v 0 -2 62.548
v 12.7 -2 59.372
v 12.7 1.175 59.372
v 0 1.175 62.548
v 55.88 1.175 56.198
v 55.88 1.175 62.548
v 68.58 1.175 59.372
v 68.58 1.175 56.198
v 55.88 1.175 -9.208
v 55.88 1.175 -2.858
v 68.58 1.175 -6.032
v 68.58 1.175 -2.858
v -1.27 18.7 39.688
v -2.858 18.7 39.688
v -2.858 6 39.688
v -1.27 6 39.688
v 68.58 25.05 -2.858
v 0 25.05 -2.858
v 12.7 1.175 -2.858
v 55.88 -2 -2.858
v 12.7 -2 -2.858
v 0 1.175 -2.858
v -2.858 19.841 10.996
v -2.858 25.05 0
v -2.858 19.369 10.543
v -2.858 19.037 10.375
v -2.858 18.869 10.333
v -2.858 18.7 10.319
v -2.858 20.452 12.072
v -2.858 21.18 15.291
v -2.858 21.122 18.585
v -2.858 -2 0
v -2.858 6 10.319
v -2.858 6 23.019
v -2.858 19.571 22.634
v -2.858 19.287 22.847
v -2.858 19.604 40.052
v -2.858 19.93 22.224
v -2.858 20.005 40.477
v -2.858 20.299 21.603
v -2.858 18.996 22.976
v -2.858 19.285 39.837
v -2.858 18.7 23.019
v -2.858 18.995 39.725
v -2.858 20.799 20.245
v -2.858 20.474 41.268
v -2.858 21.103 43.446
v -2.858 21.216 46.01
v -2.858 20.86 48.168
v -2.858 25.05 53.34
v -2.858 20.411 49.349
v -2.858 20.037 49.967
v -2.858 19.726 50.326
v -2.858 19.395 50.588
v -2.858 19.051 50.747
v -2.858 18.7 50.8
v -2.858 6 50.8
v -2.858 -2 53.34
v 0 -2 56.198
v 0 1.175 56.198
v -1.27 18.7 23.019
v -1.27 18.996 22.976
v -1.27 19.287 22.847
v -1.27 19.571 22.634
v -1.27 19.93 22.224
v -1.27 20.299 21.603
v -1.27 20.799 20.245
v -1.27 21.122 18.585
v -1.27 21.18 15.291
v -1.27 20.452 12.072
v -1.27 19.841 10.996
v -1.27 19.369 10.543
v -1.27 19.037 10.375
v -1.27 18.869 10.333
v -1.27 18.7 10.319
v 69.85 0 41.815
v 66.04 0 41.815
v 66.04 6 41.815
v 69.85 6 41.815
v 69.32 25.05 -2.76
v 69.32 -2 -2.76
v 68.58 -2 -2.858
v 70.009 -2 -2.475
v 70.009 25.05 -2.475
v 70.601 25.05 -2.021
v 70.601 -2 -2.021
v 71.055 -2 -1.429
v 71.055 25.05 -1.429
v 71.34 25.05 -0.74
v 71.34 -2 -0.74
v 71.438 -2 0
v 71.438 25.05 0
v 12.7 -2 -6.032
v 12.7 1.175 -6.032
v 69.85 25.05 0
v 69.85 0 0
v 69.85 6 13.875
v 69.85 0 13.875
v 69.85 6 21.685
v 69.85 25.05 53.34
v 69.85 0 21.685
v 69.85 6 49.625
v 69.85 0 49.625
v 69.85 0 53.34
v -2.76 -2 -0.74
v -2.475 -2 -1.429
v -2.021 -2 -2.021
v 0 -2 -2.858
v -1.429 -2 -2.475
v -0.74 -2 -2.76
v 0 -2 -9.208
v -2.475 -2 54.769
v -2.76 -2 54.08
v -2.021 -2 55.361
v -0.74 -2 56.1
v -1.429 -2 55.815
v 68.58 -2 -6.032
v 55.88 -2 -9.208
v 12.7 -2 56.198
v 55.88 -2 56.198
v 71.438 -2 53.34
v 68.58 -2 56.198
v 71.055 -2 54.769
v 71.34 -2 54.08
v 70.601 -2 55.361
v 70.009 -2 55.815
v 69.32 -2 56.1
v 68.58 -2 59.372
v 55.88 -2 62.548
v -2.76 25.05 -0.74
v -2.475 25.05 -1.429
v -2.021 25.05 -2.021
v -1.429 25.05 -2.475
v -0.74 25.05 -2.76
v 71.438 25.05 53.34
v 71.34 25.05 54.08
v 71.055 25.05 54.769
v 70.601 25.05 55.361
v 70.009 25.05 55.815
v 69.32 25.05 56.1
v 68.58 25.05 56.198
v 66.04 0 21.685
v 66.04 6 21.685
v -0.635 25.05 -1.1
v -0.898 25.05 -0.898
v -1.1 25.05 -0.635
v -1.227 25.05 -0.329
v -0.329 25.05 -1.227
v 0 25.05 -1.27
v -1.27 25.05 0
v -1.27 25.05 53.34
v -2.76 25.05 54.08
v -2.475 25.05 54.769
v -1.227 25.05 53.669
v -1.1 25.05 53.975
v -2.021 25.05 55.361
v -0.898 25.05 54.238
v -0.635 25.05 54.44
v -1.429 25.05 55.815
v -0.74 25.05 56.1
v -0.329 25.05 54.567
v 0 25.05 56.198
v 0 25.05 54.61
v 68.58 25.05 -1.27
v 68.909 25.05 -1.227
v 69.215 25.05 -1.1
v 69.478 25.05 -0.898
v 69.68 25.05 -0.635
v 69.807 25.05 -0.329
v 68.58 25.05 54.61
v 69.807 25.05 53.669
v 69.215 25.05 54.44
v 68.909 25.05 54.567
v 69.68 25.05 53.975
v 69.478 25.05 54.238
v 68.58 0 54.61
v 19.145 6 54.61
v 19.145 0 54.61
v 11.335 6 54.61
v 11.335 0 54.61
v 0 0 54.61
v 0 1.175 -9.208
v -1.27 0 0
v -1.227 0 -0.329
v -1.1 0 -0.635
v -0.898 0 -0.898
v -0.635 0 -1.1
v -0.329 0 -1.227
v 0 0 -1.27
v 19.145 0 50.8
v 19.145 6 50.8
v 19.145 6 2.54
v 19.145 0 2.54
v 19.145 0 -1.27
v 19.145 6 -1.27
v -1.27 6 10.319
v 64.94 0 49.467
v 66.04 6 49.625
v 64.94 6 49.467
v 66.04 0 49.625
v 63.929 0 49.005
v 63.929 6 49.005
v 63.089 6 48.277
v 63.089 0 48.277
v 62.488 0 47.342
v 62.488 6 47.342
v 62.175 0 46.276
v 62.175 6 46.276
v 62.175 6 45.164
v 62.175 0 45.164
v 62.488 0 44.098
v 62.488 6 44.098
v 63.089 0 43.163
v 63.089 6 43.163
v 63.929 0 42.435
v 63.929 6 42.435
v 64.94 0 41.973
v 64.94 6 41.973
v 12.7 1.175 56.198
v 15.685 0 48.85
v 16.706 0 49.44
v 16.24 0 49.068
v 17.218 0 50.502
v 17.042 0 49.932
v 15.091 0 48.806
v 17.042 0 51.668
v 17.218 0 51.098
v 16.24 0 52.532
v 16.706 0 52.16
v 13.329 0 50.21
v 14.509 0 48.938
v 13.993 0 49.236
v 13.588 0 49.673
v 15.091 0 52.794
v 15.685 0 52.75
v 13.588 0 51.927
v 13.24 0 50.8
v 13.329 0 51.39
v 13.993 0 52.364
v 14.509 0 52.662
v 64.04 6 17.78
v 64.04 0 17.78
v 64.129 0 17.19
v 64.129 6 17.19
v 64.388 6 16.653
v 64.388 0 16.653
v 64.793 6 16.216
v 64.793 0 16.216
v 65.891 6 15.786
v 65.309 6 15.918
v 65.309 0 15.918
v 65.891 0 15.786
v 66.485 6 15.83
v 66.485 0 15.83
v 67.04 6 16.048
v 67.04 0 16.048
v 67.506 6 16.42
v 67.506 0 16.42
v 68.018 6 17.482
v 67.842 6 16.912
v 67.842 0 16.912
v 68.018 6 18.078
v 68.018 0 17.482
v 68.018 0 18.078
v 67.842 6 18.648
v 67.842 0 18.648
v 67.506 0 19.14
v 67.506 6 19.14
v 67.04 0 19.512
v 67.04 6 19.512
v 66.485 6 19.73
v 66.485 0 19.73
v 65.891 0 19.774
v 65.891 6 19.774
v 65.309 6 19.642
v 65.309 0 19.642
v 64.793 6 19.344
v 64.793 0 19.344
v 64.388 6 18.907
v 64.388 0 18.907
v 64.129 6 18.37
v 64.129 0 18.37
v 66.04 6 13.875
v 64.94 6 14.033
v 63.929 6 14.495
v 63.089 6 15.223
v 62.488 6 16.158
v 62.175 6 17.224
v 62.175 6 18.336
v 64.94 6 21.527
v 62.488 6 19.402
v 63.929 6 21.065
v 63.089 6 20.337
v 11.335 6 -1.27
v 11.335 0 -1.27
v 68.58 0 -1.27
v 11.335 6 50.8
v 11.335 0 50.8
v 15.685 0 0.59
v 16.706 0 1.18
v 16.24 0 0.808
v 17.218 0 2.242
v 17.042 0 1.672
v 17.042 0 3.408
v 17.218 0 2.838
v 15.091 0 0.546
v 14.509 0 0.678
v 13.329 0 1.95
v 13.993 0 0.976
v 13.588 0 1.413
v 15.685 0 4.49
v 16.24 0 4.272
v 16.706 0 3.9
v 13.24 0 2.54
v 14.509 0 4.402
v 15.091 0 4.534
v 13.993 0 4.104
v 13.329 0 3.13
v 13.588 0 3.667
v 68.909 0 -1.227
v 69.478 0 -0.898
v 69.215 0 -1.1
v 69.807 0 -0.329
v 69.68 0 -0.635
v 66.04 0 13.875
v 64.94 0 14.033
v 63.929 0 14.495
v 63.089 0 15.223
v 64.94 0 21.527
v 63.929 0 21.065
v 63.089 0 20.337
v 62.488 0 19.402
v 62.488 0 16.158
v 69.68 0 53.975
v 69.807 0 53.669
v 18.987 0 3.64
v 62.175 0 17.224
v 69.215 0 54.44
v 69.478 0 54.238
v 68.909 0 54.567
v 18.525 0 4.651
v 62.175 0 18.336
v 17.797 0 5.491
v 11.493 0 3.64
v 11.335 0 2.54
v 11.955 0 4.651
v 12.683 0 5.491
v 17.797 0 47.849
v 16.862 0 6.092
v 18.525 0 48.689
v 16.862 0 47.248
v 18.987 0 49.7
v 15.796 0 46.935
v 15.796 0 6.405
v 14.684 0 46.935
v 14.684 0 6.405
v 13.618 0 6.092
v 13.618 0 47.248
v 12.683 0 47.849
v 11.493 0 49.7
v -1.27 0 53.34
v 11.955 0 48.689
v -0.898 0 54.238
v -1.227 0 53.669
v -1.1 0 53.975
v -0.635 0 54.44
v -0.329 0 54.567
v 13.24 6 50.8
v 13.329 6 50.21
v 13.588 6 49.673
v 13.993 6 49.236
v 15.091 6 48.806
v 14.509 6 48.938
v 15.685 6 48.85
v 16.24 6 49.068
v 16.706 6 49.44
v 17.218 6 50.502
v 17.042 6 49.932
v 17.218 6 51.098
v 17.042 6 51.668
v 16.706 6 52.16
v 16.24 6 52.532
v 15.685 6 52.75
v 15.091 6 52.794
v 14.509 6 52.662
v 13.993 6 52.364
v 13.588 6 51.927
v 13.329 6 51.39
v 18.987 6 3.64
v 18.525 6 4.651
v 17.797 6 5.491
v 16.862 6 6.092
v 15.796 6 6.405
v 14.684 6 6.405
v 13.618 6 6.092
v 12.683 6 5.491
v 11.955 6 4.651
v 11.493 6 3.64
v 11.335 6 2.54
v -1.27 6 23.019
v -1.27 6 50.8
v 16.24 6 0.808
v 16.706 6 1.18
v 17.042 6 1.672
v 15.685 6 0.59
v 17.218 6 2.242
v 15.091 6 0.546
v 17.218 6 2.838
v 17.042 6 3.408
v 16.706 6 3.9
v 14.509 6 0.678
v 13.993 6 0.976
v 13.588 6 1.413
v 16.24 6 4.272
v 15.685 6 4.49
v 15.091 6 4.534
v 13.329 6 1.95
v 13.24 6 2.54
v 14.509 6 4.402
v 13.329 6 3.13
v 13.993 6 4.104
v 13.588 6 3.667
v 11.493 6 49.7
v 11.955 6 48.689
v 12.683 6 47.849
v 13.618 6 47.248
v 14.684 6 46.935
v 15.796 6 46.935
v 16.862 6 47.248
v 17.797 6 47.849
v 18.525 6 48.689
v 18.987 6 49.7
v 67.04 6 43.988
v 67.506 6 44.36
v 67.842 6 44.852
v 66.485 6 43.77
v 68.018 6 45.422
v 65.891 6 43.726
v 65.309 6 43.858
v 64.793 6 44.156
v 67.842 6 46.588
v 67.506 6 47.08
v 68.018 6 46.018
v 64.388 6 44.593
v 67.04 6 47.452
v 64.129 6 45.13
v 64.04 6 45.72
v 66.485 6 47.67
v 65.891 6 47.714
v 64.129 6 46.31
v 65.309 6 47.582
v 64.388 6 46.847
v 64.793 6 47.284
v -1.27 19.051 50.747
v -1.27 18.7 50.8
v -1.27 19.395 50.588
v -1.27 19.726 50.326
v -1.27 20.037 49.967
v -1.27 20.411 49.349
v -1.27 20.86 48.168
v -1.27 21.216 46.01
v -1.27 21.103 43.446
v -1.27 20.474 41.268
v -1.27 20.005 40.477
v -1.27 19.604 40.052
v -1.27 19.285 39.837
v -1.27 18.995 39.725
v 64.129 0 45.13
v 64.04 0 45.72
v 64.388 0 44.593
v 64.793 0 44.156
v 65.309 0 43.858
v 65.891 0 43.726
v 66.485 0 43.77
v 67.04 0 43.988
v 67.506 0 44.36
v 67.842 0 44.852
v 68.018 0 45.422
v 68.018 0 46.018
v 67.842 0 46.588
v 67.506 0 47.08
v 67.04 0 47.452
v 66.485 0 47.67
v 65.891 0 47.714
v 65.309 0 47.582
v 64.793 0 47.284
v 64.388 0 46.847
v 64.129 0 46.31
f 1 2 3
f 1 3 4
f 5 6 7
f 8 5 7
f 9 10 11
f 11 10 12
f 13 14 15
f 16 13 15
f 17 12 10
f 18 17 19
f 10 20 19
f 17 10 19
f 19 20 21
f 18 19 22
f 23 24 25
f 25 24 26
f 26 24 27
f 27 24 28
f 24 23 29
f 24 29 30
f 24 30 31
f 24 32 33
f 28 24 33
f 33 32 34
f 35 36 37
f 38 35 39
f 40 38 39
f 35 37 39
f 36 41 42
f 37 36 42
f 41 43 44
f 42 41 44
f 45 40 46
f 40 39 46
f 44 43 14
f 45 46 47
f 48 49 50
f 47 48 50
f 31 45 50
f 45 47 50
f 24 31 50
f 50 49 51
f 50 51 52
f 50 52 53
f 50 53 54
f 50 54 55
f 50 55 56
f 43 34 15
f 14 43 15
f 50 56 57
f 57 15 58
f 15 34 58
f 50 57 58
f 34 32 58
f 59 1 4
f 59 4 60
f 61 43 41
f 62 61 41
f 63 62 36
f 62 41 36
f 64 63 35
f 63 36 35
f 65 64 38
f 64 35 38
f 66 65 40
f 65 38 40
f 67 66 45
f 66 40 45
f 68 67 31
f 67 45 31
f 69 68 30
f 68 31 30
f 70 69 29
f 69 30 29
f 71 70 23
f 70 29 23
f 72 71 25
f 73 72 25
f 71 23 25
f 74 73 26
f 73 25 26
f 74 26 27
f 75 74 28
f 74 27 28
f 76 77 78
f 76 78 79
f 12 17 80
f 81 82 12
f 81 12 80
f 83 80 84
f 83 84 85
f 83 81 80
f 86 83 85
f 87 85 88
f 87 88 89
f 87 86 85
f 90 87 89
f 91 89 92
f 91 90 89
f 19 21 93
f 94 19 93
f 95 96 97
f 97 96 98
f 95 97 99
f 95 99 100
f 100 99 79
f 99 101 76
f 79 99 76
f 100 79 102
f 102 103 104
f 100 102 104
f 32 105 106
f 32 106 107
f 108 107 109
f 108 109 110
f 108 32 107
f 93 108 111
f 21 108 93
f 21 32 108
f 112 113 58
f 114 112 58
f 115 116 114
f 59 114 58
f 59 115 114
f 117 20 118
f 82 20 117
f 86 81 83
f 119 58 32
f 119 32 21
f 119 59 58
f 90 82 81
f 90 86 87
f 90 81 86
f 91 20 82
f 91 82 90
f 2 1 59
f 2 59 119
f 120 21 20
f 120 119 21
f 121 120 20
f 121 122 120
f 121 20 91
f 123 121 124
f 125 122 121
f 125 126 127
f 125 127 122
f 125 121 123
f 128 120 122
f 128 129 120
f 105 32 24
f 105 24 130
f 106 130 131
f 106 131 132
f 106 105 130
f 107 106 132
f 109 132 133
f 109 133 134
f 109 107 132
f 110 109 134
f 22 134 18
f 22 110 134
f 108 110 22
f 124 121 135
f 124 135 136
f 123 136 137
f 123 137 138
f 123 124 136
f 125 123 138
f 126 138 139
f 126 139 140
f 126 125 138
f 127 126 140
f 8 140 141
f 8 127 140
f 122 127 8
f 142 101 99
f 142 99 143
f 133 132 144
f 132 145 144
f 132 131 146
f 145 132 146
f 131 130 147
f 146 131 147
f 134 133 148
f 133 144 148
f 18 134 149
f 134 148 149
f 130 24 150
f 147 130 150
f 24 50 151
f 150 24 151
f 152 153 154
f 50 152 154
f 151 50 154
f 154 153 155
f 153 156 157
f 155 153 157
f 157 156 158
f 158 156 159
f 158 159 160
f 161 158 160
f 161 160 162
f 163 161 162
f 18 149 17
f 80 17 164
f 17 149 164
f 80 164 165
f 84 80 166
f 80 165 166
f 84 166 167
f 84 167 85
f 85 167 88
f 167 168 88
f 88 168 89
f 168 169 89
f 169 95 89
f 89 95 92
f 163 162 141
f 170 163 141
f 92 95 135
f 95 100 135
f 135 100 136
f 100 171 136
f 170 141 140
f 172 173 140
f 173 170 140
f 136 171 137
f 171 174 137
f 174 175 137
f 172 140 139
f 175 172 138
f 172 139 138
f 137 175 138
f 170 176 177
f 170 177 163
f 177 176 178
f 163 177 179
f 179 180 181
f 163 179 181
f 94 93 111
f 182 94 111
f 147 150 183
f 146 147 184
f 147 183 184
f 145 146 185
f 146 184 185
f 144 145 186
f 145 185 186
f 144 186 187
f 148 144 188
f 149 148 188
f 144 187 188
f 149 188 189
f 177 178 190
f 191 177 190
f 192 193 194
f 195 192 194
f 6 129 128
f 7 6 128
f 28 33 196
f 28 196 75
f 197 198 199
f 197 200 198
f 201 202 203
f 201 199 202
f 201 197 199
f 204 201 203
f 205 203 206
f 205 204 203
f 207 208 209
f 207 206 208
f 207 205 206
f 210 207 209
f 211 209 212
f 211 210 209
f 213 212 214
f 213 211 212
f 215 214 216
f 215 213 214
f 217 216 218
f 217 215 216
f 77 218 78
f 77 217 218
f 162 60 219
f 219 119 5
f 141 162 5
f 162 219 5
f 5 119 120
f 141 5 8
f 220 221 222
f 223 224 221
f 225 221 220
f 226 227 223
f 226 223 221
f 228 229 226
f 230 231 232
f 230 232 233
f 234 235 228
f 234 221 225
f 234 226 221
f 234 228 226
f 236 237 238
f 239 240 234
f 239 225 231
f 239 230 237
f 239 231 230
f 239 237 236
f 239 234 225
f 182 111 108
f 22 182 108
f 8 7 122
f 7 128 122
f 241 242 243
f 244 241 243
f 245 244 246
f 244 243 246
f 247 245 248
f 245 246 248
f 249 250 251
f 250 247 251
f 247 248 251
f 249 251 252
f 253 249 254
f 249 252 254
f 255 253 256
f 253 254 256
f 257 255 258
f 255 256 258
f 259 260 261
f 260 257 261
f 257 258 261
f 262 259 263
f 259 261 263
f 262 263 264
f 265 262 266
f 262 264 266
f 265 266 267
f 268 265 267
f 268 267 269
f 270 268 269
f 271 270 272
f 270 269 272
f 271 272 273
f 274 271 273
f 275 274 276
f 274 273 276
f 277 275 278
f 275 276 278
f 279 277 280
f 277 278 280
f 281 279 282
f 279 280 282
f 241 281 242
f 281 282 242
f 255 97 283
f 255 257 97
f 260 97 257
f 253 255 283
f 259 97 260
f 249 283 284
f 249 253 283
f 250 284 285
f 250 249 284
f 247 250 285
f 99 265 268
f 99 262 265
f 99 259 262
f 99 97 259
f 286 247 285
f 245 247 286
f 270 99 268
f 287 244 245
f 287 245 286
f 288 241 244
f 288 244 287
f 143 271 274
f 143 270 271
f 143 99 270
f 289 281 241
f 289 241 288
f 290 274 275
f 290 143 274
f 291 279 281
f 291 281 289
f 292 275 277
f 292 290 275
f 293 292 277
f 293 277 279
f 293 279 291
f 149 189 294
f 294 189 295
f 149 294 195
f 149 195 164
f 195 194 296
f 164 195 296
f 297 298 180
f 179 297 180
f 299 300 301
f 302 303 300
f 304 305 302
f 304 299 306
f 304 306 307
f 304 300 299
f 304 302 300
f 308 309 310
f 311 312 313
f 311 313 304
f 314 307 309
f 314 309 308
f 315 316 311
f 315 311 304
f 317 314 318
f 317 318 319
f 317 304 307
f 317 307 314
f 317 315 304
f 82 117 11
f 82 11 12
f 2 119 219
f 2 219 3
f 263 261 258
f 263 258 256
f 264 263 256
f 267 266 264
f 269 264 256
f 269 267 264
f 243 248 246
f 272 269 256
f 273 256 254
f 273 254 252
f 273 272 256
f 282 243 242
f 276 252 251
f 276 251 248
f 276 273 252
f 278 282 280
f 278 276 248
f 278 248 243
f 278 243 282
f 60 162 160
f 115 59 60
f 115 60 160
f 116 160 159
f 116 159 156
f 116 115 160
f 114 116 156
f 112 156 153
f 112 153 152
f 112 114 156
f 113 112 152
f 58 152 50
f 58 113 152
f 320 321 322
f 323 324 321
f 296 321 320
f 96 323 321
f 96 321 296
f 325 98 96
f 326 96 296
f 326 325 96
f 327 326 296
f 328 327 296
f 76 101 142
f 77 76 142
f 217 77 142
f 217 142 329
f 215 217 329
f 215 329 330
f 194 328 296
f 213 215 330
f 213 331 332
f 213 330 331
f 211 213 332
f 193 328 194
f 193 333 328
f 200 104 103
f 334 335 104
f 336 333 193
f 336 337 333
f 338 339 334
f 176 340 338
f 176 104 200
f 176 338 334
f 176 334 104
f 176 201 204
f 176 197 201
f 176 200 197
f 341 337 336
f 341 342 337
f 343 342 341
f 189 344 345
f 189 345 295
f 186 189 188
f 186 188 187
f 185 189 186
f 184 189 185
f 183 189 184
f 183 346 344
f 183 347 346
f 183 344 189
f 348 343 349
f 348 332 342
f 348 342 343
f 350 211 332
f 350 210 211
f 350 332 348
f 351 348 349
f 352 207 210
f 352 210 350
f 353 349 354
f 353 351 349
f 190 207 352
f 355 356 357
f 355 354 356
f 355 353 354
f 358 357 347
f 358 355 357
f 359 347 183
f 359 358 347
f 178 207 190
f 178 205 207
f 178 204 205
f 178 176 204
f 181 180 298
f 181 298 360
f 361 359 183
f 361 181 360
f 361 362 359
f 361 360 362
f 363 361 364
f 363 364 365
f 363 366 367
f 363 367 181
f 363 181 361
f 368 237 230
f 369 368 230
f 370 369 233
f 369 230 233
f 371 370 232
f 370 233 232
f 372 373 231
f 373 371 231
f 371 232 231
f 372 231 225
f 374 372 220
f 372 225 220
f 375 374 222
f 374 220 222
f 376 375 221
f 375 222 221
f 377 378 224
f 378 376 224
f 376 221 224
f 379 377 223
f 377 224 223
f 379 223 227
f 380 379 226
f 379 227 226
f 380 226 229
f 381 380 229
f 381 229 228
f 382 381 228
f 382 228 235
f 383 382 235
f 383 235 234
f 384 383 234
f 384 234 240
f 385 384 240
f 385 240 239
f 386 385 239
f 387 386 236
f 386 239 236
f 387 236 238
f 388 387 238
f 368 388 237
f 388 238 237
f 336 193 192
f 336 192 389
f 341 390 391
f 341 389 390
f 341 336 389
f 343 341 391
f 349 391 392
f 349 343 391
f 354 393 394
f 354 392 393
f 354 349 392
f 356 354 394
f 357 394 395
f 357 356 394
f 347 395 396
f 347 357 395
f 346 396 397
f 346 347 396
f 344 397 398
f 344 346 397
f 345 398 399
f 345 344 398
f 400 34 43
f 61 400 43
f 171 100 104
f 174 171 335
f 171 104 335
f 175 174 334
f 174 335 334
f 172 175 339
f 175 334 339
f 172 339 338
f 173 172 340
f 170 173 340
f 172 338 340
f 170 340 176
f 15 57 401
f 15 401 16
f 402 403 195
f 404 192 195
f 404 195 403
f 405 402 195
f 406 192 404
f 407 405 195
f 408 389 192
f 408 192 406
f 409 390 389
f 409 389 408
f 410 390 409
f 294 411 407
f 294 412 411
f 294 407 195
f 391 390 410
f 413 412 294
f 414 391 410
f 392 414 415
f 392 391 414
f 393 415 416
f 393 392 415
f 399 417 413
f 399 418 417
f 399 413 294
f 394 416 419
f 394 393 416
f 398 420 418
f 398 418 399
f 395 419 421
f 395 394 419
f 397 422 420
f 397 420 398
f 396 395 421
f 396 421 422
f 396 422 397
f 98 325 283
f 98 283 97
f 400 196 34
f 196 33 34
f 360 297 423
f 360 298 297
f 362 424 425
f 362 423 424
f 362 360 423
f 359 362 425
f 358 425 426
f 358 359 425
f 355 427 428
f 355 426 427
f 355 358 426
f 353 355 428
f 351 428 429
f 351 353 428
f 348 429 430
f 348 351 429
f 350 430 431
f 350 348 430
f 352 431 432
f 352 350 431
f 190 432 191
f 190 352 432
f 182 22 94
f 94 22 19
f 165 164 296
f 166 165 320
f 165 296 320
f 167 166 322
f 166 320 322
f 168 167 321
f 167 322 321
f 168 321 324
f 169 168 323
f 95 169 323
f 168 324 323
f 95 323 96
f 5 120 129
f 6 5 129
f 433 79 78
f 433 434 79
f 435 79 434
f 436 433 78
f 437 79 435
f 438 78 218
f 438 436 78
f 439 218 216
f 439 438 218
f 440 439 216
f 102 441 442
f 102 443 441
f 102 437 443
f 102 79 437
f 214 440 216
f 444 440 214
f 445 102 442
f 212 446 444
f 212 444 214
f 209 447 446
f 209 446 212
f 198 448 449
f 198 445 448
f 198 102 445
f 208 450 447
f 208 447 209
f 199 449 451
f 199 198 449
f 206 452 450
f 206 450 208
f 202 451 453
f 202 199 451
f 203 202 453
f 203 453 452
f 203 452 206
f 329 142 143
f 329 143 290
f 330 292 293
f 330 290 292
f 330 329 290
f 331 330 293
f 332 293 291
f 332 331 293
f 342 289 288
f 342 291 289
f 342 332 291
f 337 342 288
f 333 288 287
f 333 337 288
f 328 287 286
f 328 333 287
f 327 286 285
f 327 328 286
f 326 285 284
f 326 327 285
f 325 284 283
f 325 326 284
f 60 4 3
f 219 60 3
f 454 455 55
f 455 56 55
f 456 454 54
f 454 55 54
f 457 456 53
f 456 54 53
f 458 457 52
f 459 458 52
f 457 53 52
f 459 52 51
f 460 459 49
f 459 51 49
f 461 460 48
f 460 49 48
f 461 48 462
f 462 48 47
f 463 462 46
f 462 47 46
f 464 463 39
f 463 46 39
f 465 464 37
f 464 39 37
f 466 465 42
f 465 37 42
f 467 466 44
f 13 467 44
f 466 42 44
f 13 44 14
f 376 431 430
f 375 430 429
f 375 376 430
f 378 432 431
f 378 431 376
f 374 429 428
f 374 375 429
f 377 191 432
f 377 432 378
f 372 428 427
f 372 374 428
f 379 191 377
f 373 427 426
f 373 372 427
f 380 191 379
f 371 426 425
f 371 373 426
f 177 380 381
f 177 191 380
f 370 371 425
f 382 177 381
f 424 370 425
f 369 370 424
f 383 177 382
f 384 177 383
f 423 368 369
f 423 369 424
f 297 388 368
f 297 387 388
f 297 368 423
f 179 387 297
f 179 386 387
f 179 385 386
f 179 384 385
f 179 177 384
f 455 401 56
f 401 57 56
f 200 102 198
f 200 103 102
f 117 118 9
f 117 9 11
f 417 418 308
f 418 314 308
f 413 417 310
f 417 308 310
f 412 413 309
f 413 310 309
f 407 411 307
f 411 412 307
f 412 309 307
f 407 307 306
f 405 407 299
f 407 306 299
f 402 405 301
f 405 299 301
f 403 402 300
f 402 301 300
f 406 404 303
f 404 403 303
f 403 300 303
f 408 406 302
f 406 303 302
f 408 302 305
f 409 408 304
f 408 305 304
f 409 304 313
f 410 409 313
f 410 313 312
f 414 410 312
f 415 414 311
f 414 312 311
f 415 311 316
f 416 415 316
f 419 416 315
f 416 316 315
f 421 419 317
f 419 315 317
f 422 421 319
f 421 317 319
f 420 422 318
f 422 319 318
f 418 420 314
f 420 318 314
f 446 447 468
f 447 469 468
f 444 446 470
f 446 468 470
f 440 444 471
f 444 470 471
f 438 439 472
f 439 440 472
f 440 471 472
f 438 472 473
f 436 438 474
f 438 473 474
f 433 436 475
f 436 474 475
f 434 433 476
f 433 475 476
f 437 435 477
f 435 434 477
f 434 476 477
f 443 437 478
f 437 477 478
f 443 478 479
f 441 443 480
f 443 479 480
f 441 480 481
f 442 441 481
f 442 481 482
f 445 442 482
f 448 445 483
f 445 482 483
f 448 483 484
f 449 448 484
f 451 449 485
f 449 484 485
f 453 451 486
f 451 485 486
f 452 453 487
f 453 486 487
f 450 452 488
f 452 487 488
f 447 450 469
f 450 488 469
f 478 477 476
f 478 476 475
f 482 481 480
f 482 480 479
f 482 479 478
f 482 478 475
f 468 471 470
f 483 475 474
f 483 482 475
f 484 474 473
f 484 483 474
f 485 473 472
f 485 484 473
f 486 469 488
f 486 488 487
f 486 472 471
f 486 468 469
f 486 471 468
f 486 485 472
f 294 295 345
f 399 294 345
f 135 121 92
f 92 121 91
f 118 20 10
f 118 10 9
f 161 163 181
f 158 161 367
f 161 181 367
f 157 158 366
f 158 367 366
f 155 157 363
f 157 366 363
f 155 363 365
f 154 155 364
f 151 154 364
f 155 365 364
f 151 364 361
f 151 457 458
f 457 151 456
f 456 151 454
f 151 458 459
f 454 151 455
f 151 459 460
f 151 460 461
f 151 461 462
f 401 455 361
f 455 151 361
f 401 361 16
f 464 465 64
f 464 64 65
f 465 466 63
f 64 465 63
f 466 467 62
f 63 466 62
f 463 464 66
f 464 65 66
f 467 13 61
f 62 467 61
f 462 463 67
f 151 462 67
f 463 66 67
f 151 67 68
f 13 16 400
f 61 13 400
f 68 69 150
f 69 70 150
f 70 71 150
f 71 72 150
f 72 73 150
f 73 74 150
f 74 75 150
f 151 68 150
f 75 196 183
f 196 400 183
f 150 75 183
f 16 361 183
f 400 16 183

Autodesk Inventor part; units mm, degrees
ref_plane "YZ Plane" through (0, 0, 0) normal (1, 0, 0) x (0, 1, 0)
ref_plane "XZ Plane" through (0, 0, 0) normal (0, 1, 0) x (-1, 0, 0)
ref_plane "XY Plane" through (0, 0, 0) normal (0, 0, 1) x (1, 0, 0)
sketch "Sketch1" plane through (0, 0, 0) normal (0, 1, 0) x (-1, 0, 0)
  circle A0 centre (-15.24, 2.54) radius 2
  circle A1 centre (-66.04, 17.78) radius 2
  circle A2 centre (-66.04, 45.72) radius 2
  circle A3 centre (-15.24, 50.8) radius 2
  line L0 (0, 0) -> (-68.58, 0) construction
  line L1 (-68.58, 0) -> (-68.58, 53.34) construction
  line L2 (-68.58, 53.34) -> (0, 53.34) construction
  line L3 (0, 53.34) -> (0, 0) construction
  line L4 (-68.58, -1.27) -> (0, -1.27)
  line L5 (1.27, 0) -> (1.27, 53.34)
  line L6 (0, 54.61) -> (-68.58, 54.61)
  line L7 (-69.85, 53.34) -> (-69.85, 0)
  arc A4 (0, -1.27) -> (1.27, 0) centre (0, 0) ccw
  arc A5 (-69.85, 0) -> (-68.58, -1.27) centre (-68.58, 0) ccw
  arc A6 (-68.58, 54.61) -> (-69.85, 53.34) centre (-68.58, 53.34) ccw
  arc A7 (1.27, 53.34) -> (0, 54.61) centre (0, 53.34) ccw
  arc A8 (-11.335, 2.54) -> (-19.145, 2.54) centre (-15.24, 2.54) ccw
  arc A9 (-19.145, 50.8) -> (-11.335, 50.8) centre (-15.24, 50.8) ccw
  arc A10 (-66.04, 41.815) -> (-66.04, 49.625) centre (-66.04, 45.72) ccw
  arc A11 (-66.04, 13.875) -> (-66.04, 21.685) centre (-66.04, 17.78) ccw
  line L8 (-11.335, 2.54) -> (-19.145, 2.54) construction
  line L9 (-19.145, 2.54) -> (-19.145, -1.27)
  line L10 (-19.145, -1.27) -> (-11.335, -1.27)
  line L11 (-11.335, -1.27) -> (-11.335, 2.54)
  line L12 (-66.04, 13.875) -> (-69.85, 13.875)
  line L13 (-69.85, 13.875) -> (-69.85, 21.685)
  line L14 (-69.85, 21.685) -> (-66.04, 21.685)
  line L15 (-66.04, 21.685) -> (-66.04, 13.875) construction
  line L16 (-66.04, 41.815) -> (-69.85, 41.815)
  line L17 (-69.85, 41.815) -> (-69.85, 49.625)
  line L18 (-69.85, 49.625) -> (-66.04, 49.625)
  line L19 (-66.04, 49.625) -> (-66.04, 41.815) construction
  line L20 (-19.145, 50.8) -> (-11.335, 50.8) construction
  line L21 (-11.335, 50.8) -> (-11.335, 54.61)
  line L22 (-11.335, 54.61) -> (-19.145, 54.61)
  line L23 (-19.145, 54.61) -> (-19.145, 50.8)
  dimension "d0" = 4
  dimension "d4" = 15.24
  dimension "d5" = 2.54
  dimension "d6" = 17.78
  dimension "d7" = 66.04
  dimension "d8" = 45.72
  dimension "d9" = 50.8
  dimension "d10" = 2.54
  dimension "d11" = 2.54
  dimension "d12" = 1.27
  dimension "d13" = 1.27
  dimension "d14" = 1.905
extrude "Extrusion1" add sketch "Sketch1" along normal blind 6 contours L9 A8 L11 L4 | L7 L14 A11 L12 | L7 L18 A10 L16 | L21 A9 L23 L6
extrude "Extrusion2" add sketch "Sketch1" against normal blind 2 contours A0 | A1 | A2 | A3 | A5 L7 L12 A11 L14 L16 A10 L18 A6 L6 L23 A9 L21 A7 L5 A4 L4 L11 A8 L9 | L9 A8 L11 L4 | L7 L14 A11 L12 | L7 L18 A10 L16 | L21 A9 L23 L6
sketch "Sketch2" plane through (0, -2, 0) normal (0, -1, 0) x (1, 0, 0)
  line L0 (68.58, 54.61) -> (0, 54.61) projected
  arc A0 (0, 54.61) -> (-1.27, 53.34) centre (0, 53.34) ccw projected
  line L1 (-1.27, 53.34) -> (-1.27, 0) projected
  arc A1 (-1.27, 0) -> (0, -1.27) centre (0, 0) ccw projected
  line L2 (0, -1.27) -> (68.58, -1.27) projected
  arc A2 (68.58, -1.27) -> (69.85, 0) centre (68.58, 0) ccw projected
  line L3 (69.85, 0) -> (69.85, 53.34) projected
  arc A3 (69.85, 53.34) -> (68.58, 54.61) centre (68.58, 53.34) ccw projected
  line L4 (68.58, -2.8575) -> (0, -2.8575)
  arc A4 (-2.8575, 0) -> (0, -2.8575) centre (0, 0) ccw
  line L5 (-2.8575, 0) -> (-2.8575, 53.34)
  arc A5 (0, 56.1975) -> (-2.8575, 53.34) centre (0, 53.34) ccw
  line L6 (0, 56.1975) -> (68.58, 56.1975)
  arc A6 (71.4375, 53.34) -> (68.58, 56.1975) centre (68.58, 53.34) ccw
  line L7 (71.4375, 53.34) -> (71.4375, 0)
  arc A7 (68.58, -2.8575) -> (71.4375, 0) centre (68.58, 0) ccw
  point P0 (0, 0)
  dimension "d19" = 1.5875
extrude "Extrusion3" add sketch "Sketch2" against normal blind 27.05
sketch "Sketch4" plane through (-2.8575, -2, 0) normal (-1, 0, 0) x (0, 0, 1)
  line L0 (2.54, 8) -> (-1.27, 8) projected
  line L1 (-1.27, 8) -> (2.54, 8) projected
  line L2 (2.54, 8) -> (2.54, 8) projected
  line L3 (0.54, 8) -> (4.54, 8) projected
  line L4 (0, 2) -> (53.34, 2) projected
  line L5 (50.8, 8) -> (54.61, 8) projected
  line L6 (54.61, 8) -> (50.8, 8) projected
  line L7 (50.8, 8) -> (50.8, 8) projected
  line L8 (48.8, 8) -> (52.8, 8) projected
  line L9 (0, 27.05) -> (53.34, 27.05) projected
  line L10 (50.8, 8) -> (54.61, 8) projected
  line L11 (50.8, 8) -> (46.895, 8) projected
  line L12 (50.8, 8) -> (50.8, 20.7)
  line L13 (50.8, 20.7) -> (39.6875, 20.7) construction
  line L14 (43.72, 8) -> (47.72, 8) projected
  line L15 (39.6875, 20.7) -> (39.6875, 8)
  line L16 (39.6875, 8) -> (50.8, 8)
  ellipse E0 centre (45.2438, 20.7) end of major axis (50.8, 20.7) minor radius 2.54 (50.8, 20.7) -> (39.6875, 20.7) ccw
  ellipse E1 centre (45.2438, 20.7) end of major axis (50.8, 20.7) minor radius 2.54 (39.6875, 20.7) -> (50.8, 20.7) ccw construction
  line L17 (10.3188, 8) -> (10.3188, 20.7)
  line L18 (10.3188, 8) -> (23.0188, 8)
  line L19 (15.78, 8) -> (19.78, 8) projected
  line L20 (23.0188, 8) -> (23.0188, 20.7)
  ellipse E2 centre (16.6688, 20.7) end of major axis (23.0188, 20.7) minor radius 2.54 (23.0188, 20.7) -> (10.3188, 20.7) ccw
  point P0 (2.54, 2)
  point P1 (2.54, 2)
  point P2 (2.54, 2)
  point P3 (50.8, 2)
  point P4 (2.54, 2)
  point P5 (16.6688, 8)
  dimension "d26" = 2.54
  dimension "d29" = 2.54
  dimension "d24" = 12.7
  dimension "d25" = 11.1125
  dimension "d27" = 10.3187
  dimension "d28" = 12.7
extrude "Extrusion5" cut sketch "Sketch4" against normal up to surface (1.5875 mm away)
sketch "Sketch5" plane through (0, -2, 0) normal (0, -1, 0) x (1, 0, 0)
  line L0 (68.58, 56.1975) -> (0, 56.1975) projected
  arc A0 (0, 56.1975) -> (-2.8575, 53.34) centre (0, 53.34) ccw projected
  line L1 (-2.8575, 53.34) -> (-2.8575, 0) projected
  arc A1 (-2.8575, 0) -> (0, -2.8575) centre (0, 0) ccw projected
  line L2 (0, -2.8575) -> (68.58, -2.8575) projected
  arc A2 (68.58, -2.8575) -> (71.4375, 0) centre (68.58, 0) ccw projected
  line L3 (71.4375, 0) -> (71.4375, 53.34) projected
  arc A3 (71.4375, 53.34) -> (68.58, 56.1975) centre (68.58, 53.34) ccw projected
  line L4 (0, 56.1975) -> (68.58, 56.1975) projected
  line L5 (0, 56.1975) -> (12.7, 56.1975)
  line L6 (12.7, 56.1975) -> (12.7, 59.3725)
  line L7 (0, 62.5475) -> (0, 62.5475)
  line L8 (0, 62.5475) -> (0, 56.1975)
  line L9 (68.58, 56.1975) -> (55.88, 56.1975)
  line L10 (55.88, 56.1975) -> (55.88, 62.5475)
  line L11 (55.88, 62.5475) -> (55.88, 62.5475)
  line L12 (68.58, 59.3725) -> (68.58, 56.1975)
  line L13 (0, -2.8575) -> (12.7, -2.8575)
  line L14 (12.7, -2.8575) -> (12.7, -6.0325)
  line L15 (0, -9.2075) -> (0, -9.2075)
  line L16 (0, -9.2075) -> (0, -2.8575)
  line L17 (68.58, -2.8575) -> (0, -2.8575) projected
  line L18 (68.58, -2.8575) -> (55.88, -2.8575)
  line L19 (55.88, -2.8575) -> (55.88, -9.2075)
  line L20 (55.88, -9.2075) -> (55.88, -9.2075)
  line L21 (68.58, -6.0325) -> (68.58, -2.8575)
  line L22 (12.7, 59.3725) -> (0, 62.5475)
  line L23 (55.88, 62.5475) -> (68.58, 59.3725)
  line L24 (12.7, -6.0325) -> (0, -9.2075)
  line L25 (55.88, -9.2075) -> (68.58, -6.0325)
  point P0 (0, 0)
  point P1 (12.7, 62.5475)
  point P2 (68.58, 62.5475)
  point P3 (12.7, -9.2075)
  point P4 (68.58, -9.2075)
  dimension "d32" = 12.7
  dimension "d33" = 6.35
  dimension "d34" = 12.7
  dimension "d35" = 6.35
  dimension "d36" = 12.7
  dimension "d37" = 6.35
  dimension "d38" = 12.7
  dimension "d39" = 6.35
  dimension "d40" = 3.175
  dimension "d41" = 12.7
  dimension "d42" = 12.7
  dimension "d43" = 3.175
  dimension "d44" = 3.175
  dimension "d45" = 12.7
  dimension "d46" = 12.7
  dimension "d47" = 3.175
extrude "Extrusion6" add sketch "Sketch5" against normal blind 3.175 contours L0 L10 L23 L12 | L0 L8 L22 L6 | L21 L25 L19 L2 | L14 L24 L16 L2
equation "\"d42\" = d41"
equation "\"d43\" = d40"
equation "\"d44\" = d40"
equation "\"d45\" = d41"
equation "\"d46\" = d41"
equation "\"d47\" = d40"
properties part number "ArduinoHolder-v1"
